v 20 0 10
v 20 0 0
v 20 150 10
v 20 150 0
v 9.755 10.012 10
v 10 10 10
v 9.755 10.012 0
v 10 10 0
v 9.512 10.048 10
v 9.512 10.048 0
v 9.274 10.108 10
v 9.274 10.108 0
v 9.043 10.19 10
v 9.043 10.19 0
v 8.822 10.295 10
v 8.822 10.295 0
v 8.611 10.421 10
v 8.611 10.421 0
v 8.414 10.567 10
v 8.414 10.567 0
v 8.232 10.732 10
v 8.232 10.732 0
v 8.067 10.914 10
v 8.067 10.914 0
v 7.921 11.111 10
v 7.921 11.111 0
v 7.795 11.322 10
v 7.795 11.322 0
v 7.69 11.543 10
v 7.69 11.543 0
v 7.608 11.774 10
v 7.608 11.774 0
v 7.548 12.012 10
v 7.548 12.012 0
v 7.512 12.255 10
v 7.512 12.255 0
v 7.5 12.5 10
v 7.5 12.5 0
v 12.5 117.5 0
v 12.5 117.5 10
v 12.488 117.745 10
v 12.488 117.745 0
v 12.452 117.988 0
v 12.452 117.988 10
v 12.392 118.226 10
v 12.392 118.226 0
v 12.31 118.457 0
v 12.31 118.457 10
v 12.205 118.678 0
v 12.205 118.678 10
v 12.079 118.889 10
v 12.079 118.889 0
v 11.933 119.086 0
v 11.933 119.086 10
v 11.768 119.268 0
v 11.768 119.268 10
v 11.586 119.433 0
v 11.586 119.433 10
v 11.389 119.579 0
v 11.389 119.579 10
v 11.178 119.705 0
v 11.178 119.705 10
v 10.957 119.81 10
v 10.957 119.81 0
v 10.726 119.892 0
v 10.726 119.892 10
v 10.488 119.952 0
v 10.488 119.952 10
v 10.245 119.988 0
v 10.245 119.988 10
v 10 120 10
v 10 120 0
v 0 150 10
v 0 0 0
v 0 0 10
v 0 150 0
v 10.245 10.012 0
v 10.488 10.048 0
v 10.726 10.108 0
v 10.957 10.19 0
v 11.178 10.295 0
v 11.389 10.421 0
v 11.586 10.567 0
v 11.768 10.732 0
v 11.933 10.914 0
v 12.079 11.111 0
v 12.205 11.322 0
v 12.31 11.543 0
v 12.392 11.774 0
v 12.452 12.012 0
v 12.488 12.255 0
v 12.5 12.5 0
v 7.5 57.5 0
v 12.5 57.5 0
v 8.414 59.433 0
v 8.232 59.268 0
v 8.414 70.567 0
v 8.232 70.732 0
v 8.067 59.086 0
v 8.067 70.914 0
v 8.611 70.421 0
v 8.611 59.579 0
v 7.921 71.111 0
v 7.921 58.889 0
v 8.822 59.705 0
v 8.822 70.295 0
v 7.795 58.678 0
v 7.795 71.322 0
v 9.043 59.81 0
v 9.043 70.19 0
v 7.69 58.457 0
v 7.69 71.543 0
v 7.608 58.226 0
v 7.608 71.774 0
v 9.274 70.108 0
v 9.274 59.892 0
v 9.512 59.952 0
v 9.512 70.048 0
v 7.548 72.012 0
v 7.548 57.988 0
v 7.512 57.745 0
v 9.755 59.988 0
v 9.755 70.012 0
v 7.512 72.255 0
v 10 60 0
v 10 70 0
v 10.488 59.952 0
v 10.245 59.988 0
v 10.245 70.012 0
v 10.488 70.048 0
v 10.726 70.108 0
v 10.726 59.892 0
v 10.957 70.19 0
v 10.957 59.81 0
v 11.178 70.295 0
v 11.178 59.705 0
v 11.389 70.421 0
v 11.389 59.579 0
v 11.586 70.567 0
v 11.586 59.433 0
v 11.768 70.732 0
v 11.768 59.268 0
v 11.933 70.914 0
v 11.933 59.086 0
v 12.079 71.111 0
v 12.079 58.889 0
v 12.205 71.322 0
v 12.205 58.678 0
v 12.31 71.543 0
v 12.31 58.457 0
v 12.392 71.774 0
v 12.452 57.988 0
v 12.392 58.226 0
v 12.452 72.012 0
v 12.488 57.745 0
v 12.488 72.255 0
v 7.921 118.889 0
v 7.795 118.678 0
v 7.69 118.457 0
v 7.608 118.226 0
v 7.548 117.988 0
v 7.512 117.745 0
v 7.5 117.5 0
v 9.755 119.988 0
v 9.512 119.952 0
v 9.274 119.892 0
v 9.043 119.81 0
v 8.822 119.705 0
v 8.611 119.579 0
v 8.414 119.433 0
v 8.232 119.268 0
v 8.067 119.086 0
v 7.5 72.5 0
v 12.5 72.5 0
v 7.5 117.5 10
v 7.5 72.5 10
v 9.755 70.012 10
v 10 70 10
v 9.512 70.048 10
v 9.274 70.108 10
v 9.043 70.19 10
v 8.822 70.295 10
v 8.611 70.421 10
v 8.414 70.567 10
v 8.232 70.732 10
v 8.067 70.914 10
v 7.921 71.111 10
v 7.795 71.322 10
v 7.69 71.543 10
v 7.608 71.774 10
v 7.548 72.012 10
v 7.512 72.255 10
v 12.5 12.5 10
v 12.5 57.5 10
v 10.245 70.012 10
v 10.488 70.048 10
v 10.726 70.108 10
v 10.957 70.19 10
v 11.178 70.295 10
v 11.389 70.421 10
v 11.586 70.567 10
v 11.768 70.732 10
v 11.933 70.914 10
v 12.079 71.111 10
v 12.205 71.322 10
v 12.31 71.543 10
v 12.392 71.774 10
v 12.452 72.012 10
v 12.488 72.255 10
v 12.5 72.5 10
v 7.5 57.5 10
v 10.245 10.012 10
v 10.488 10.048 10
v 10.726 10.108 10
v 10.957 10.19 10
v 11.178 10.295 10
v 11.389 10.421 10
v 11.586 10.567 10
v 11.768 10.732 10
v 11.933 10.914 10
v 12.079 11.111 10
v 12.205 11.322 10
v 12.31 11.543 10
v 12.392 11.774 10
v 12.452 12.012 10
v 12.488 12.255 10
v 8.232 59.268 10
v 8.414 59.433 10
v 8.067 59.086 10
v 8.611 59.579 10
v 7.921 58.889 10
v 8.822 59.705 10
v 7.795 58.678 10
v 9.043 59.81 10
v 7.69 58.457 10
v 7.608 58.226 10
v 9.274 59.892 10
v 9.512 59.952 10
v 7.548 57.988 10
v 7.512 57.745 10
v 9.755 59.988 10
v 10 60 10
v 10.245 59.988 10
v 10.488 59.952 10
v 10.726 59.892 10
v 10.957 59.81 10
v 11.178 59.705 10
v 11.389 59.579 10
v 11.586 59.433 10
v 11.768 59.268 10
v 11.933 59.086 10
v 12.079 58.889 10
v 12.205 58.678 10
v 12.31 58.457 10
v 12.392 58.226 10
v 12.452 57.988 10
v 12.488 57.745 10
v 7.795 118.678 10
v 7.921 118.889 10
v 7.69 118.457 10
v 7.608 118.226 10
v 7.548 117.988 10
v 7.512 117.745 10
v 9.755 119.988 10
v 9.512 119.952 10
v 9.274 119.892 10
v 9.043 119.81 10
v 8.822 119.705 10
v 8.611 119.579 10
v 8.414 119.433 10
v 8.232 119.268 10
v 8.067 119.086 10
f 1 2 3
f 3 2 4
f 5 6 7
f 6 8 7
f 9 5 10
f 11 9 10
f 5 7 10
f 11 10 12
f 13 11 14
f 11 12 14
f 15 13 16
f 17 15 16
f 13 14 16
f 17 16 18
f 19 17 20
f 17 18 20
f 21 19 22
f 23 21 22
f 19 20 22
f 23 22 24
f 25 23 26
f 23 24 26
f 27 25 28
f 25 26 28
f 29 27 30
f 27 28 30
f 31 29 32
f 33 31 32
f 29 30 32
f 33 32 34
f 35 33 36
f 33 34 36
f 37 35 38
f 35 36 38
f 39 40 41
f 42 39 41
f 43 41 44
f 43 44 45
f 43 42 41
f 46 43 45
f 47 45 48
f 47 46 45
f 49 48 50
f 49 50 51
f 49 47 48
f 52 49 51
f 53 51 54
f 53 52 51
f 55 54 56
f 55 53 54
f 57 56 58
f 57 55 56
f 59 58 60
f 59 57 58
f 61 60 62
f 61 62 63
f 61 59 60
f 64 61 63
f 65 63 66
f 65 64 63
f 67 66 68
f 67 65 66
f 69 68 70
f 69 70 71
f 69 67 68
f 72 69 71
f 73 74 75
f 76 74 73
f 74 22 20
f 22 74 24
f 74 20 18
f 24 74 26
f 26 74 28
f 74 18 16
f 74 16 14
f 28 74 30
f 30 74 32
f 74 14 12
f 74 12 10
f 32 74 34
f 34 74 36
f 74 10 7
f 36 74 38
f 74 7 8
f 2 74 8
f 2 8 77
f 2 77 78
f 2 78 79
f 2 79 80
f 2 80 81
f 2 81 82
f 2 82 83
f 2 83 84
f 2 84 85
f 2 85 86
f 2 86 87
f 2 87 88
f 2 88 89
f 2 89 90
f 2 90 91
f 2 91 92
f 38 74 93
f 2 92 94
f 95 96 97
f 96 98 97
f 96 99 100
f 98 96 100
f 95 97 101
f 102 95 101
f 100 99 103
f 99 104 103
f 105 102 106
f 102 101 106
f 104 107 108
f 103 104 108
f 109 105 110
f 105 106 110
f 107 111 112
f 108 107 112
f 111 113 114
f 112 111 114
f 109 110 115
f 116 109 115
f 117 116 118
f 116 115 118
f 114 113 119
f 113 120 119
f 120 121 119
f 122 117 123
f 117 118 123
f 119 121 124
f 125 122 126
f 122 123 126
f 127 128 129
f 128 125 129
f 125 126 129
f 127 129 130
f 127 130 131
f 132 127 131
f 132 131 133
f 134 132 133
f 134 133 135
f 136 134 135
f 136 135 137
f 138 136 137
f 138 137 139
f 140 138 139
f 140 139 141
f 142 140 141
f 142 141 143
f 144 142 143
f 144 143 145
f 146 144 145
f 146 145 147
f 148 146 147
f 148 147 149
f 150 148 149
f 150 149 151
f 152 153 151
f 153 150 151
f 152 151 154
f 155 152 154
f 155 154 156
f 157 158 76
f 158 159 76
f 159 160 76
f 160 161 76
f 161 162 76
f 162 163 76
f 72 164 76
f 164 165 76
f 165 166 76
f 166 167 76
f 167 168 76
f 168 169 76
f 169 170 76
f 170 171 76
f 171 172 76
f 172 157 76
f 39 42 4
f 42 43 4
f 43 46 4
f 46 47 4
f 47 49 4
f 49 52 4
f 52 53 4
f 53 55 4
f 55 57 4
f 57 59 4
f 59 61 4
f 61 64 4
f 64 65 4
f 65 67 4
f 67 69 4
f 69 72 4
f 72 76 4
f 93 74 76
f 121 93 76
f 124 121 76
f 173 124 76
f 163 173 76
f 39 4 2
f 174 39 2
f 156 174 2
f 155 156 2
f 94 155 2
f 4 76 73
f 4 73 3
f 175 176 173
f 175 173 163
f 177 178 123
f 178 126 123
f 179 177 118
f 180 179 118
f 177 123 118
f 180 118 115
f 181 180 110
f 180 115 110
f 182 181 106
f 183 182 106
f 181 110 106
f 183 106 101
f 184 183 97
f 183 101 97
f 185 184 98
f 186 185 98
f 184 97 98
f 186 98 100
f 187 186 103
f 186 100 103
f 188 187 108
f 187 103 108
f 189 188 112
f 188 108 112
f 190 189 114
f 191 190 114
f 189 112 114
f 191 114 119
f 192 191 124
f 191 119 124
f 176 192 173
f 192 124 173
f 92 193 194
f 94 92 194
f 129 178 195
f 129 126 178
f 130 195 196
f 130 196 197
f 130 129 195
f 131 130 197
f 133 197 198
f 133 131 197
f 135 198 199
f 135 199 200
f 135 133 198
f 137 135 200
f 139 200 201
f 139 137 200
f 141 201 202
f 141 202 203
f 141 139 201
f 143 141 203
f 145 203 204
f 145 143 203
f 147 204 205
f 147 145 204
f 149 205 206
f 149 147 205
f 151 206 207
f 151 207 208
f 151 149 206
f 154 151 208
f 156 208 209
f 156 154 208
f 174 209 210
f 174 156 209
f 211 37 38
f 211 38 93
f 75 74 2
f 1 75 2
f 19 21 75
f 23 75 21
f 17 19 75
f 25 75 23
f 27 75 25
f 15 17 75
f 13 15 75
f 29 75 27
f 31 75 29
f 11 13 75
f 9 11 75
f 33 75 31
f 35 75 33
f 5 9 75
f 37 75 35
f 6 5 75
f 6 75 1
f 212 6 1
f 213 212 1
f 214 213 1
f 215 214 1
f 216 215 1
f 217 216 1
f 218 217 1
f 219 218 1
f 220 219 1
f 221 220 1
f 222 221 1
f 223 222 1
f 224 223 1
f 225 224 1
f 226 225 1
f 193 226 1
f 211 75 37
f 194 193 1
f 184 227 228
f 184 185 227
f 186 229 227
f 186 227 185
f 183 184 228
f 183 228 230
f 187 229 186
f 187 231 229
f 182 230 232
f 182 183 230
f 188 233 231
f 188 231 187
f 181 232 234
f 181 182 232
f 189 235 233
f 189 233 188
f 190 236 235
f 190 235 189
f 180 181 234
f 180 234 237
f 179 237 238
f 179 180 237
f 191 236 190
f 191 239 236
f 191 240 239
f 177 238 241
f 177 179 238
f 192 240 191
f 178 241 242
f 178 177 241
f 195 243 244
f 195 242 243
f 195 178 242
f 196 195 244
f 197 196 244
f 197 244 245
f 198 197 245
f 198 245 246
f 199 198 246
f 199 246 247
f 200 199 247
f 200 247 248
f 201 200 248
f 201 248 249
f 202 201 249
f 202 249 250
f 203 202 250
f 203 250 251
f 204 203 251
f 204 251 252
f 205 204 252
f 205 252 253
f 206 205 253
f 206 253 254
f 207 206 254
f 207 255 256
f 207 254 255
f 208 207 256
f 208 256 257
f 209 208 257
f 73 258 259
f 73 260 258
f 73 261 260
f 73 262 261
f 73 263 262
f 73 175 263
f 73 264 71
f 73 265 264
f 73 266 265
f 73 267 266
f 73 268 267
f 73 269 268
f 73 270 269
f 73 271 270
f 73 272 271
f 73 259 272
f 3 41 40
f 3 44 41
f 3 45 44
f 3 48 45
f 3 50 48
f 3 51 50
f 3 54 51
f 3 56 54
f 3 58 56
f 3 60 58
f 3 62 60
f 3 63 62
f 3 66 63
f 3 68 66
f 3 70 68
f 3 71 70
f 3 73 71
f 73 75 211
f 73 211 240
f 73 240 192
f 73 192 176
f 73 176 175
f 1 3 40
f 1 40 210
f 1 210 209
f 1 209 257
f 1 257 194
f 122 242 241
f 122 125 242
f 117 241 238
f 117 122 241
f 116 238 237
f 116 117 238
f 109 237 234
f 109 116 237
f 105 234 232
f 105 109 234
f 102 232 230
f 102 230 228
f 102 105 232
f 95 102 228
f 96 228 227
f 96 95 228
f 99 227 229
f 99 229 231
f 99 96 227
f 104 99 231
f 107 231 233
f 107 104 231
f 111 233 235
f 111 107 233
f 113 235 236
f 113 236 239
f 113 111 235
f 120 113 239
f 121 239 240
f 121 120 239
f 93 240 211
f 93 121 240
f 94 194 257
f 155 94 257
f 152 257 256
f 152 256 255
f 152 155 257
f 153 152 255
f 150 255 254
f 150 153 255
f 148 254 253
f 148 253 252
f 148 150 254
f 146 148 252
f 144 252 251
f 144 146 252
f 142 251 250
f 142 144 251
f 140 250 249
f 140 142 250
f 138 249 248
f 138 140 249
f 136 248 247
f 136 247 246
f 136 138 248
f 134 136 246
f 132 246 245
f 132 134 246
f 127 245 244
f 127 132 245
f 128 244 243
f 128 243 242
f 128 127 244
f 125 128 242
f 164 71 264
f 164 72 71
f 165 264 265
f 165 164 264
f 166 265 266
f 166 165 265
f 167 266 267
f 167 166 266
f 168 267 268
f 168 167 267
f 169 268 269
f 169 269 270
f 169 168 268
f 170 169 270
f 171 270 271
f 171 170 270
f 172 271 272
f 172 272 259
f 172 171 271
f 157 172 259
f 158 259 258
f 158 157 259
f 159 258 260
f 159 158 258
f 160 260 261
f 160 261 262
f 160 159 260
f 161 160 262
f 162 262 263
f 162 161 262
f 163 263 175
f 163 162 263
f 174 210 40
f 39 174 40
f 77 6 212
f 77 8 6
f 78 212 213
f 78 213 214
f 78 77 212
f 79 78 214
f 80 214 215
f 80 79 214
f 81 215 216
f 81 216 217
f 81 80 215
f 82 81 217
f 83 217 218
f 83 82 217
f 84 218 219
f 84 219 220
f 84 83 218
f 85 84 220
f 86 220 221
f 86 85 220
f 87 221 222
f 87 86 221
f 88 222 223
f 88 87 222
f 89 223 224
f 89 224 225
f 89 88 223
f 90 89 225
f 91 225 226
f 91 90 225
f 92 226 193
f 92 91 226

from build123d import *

# Parameters (mm, degrees)
F0_W     = 20
F0_H     = 150
F1_DEPTH = 10
F2_W     = 5
F2_H     = 50
F3_DEPTH = 25
F4_R     = 2.49999


# Not quite as in the source:
# - a fillet or chamfer is up to 0.001 mm smaller than in the source, because OpenCascade refuses the exact size


with BuildPart() as f1:
    # F0 (on Top) → F1 (new body)
    with BuildSketch(Plane.XY):
        with Locations((10, 75)):
            Rectangle(F0_W, F0_H)
    extrude(amount=F1_DEPTH)

    # F2 (on face) → F3 (cut)
    with BuildSketch(Plane.XY.offset(10)):
        with Locations((10, 95)):
            Rectangle(F2_W, F2_H)
        with Locations((10, 35)):
            Rectangle(F2_W, F2_H)
    extrude(amount=-F3_DEPTH, mode=Mode.SUBTRACT)

    # F4 (radius 2.5 in the source; OpenCascade refuses exactly that, so slightly less here)
    f4_edges = [f1.edges().sort_by_distance(p)[0] for p in [
        (12.5, 60, 5),
        (7.5, 60, 5),
        (7.5, 120, 5),
        (12.5, 120, 5),
        (7.5, 70, 5),
        (7.5, 10, 5),
        (12.5, 10, 5),
        (12.5, 70, 5),
    ]]
    fillet(f4_edges, radius=F4_R)


solid = f1.part
